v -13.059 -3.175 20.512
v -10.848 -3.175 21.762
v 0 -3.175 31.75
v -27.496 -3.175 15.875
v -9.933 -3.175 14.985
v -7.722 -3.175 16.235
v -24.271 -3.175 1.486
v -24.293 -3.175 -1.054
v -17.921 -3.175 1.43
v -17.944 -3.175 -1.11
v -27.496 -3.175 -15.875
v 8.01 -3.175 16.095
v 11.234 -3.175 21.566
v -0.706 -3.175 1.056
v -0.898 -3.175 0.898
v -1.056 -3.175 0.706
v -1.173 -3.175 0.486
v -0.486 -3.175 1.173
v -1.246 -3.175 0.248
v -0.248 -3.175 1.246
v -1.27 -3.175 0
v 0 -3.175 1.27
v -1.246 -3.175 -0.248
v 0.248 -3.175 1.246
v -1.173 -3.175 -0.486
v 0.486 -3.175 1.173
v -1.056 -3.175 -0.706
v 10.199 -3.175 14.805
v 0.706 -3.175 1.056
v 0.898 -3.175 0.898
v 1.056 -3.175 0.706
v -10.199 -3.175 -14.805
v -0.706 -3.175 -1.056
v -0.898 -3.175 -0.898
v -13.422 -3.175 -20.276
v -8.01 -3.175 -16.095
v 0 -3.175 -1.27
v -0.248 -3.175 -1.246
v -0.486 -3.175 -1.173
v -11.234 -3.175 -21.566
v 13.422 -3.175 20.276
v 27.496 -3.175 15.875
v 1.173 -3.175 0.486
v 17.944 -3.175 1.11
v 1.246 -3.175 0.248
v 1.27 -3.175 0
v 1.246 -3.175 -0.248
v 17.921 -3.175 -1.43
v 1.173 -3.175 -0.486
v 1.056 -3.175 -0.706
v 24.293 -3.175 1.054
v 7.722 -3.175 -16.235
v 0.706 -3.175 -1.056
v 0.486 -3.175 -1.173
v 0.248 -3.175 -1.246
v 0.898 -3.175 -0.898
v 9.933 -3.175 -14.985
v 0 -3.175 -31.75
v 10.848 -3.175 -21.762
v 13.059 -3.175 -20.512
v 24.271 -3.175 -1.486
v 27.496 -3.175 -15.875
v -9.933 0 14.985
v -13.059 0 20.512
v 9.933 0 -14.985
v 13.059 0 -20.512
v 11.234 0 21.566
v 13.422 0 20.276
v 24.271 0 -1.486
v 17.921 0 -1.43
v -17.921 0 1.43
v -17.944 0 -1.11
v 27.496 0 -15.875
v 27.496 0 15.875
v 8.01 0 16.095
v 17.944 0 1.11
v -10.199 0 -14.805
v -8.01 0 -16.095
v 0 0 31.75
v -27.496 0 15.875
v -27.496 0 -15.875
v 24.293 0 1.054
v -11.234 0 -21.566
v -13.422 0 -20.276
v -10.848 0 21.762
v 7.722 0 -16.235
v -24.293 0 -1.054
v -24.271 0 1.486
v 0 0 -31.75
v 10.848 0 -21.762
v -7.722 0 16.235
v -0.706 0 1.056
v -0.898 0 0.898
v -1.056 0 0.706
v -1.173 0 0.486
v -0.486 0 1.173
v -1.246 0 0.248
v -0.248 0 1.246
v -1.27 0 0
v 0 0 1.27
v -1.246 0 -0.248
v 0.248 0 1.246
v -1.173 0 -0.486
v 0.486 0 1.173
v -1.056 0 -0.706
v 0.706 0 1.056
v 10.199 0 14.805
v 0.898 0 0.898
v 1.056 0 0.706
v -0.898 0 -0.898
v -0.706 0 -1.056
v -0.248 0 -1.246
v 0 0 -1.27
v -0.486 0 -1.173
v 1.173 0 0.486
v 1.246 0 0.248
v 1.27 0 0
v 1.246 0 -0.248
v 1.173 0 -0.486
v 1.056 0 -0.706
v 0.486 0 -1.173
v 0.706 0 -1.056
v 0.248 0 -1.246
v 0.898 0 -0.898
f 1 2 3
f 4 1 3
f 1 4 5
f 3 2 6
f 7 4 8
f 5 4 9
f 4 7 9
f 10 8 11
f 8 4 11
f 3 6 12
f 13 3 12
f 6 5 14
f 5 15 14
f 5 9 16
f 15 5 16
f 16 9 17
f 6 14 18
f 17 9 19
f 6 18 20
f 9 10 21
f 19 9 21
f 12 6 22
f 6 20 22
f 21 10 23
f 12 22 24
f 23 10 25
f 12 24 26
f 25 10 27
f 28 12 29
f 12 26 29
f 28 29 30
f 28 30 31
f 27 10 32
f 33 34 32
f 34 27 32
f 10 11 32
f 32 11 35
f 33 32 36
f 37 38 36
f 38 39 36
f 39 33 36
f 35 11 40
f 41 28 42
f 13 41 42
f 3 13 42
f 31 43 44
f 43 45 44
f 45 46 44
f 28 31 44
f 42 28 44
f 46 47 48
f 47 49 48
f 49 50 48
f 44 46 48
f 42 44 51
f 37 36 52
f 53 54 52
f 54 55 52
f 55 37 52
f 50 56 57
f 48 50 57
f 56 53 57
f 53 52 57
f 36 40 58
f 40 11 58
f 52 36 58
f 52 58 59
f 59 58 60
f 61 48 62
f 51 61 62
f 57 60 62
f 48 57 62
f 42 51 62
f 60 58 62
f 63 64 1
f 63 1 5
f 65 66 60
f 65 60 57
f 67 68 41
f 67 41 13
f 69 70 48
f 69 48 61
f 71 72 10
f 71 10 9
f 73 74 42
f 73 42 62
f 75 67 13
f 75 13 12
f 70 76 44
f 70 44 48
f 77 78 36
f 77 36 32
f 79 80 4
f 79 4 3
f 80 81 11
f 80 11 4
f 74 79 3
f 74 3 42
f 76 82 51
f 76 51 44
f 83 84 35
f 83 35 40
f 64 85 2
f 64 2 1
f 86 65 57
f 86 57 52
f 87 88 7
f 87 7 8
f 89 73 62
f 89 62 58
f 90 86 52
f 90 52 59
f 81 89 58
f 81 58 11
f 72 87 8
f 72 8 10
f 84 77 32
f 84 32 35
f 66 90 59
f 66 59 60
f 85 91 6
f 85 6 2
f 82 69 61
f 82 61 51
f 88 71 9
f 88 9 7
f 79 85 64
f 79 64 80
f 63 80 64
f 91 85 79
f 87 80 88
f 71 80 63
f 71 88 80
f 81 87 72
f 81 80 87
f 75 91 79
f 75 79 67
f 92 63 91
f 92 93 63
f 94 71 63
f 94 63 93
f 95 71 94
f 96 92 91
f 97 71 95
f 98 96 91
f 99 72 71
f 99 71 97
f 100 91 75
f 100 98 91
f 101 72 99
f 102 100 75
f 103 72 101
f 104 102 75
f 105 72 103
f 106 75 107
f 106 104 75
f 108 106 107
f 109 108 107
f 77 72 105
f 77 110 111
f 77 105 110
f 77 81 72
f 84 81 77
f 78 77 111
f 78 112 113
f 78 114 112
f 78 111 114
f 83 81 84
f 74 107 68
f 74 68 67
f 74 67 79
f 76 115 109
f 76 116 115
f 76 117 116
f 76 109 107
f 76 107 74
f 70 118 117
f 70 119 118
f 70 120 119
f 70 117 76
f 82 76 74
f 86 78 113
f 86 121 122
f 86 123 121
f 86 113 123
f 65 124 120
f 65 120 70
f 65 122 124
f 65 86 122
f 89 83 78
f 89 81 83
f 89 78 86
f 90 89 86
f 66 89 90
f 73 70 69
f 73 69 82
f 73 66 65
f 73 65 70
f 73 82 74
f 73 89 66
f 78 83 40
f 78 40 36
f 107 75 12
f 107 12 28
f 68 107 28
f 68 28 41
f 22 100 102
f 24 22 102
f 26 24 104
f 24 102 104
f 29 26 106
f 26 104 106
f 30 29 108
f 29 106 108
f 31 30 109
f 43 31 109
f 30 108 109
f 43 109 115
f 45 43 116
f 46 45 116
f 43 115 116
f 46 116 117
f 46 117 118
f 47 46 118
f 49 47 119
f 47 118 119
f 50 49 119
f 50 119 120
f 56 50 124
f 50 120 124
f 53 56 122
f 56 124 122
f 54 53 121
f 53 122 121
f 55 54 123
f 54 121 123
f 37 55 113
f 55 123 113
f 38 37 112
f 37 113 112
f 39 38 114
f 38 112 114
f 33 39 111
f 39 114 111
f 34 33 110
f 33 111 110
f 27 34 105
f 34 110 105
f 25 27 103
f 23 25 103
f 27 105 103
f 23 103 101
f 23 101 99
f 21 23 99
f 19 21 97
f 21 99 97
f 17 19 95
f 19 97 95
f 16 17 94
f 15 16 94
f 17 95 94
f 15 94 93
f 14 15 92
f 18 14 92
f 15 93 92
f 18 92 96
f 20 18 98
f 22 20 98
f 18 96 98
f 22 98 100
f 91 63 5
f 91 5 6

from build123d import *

# Parameters (mm, degrees)
SKETCH1_R           = 1.27
BOSS_EXTRUDE1_DEPTH = 3.175


with BuildPart() as part:
    # Sketch1 → Boss-Extrude1 (new body)
    with BuildSketch(Plane(origin=(0, 0, 0), x_dir=(1, 0, 0), z_dir=(0, 1, 0))):
        Polygon((27.49630657, 15.875), (0, 31.75), (-27.49630657, 15.875), (-27.49630657, -15.875), (0, -31.75), (27.49630657, -15.875), align=None)
        with Locations(Location((0, 0, 0), (0, 0, 270))):
            Circle(SKETCH1_R, mode=Mode.SUBTRACT)
        Polygon((-13.422443502, 20.276025186), (-11.234134179, 21.565560882), (-8.01029494, 16.094787576), (-10.198604263, 14.805251881), align=None, mode=Mode.SUBTRACT)
        Polygon((7.722422107, 16.234876315), (10.848331148, 21.762189646), (13.059256481, 20.51182603), (9.933347439, 14.984512698), align=None, mode=Mode.SUBTRACT)
        Polygon((17.921026369, 1.429624434), (24.27077465, 1.48616446), (24.29339066, -1.053734852), (17.94364238, -1.110274878), align=None, mode=Mode.SUBTRACT)
        Polygon((10.198604263, -14.805251881), (13.422443502, -20.276025186), (11.234134179, -21.565560882), (8.01029494, -16.094787576), align=None, mode=Mode.SUBTRACT)
        Polygon((-7.722422107, -16.234876315), (-10.848331148, -21.762189646), (-13.059256481, -20.51182603), (-9.933347439, -14.984512698), align=None, mode=Mode.SUBTRACT)
        Polygon((-17.921026369, -1.429624434), (-24.27077465, -1.48616446), (-24.29339066, 1.053734852), (-17.94364238, 1.110274878), align=None, mode=Mode.SUBTRACT)
    extrude(amount=-BOSS_EXTRUDE1_DEPTH)


solid = part.part
